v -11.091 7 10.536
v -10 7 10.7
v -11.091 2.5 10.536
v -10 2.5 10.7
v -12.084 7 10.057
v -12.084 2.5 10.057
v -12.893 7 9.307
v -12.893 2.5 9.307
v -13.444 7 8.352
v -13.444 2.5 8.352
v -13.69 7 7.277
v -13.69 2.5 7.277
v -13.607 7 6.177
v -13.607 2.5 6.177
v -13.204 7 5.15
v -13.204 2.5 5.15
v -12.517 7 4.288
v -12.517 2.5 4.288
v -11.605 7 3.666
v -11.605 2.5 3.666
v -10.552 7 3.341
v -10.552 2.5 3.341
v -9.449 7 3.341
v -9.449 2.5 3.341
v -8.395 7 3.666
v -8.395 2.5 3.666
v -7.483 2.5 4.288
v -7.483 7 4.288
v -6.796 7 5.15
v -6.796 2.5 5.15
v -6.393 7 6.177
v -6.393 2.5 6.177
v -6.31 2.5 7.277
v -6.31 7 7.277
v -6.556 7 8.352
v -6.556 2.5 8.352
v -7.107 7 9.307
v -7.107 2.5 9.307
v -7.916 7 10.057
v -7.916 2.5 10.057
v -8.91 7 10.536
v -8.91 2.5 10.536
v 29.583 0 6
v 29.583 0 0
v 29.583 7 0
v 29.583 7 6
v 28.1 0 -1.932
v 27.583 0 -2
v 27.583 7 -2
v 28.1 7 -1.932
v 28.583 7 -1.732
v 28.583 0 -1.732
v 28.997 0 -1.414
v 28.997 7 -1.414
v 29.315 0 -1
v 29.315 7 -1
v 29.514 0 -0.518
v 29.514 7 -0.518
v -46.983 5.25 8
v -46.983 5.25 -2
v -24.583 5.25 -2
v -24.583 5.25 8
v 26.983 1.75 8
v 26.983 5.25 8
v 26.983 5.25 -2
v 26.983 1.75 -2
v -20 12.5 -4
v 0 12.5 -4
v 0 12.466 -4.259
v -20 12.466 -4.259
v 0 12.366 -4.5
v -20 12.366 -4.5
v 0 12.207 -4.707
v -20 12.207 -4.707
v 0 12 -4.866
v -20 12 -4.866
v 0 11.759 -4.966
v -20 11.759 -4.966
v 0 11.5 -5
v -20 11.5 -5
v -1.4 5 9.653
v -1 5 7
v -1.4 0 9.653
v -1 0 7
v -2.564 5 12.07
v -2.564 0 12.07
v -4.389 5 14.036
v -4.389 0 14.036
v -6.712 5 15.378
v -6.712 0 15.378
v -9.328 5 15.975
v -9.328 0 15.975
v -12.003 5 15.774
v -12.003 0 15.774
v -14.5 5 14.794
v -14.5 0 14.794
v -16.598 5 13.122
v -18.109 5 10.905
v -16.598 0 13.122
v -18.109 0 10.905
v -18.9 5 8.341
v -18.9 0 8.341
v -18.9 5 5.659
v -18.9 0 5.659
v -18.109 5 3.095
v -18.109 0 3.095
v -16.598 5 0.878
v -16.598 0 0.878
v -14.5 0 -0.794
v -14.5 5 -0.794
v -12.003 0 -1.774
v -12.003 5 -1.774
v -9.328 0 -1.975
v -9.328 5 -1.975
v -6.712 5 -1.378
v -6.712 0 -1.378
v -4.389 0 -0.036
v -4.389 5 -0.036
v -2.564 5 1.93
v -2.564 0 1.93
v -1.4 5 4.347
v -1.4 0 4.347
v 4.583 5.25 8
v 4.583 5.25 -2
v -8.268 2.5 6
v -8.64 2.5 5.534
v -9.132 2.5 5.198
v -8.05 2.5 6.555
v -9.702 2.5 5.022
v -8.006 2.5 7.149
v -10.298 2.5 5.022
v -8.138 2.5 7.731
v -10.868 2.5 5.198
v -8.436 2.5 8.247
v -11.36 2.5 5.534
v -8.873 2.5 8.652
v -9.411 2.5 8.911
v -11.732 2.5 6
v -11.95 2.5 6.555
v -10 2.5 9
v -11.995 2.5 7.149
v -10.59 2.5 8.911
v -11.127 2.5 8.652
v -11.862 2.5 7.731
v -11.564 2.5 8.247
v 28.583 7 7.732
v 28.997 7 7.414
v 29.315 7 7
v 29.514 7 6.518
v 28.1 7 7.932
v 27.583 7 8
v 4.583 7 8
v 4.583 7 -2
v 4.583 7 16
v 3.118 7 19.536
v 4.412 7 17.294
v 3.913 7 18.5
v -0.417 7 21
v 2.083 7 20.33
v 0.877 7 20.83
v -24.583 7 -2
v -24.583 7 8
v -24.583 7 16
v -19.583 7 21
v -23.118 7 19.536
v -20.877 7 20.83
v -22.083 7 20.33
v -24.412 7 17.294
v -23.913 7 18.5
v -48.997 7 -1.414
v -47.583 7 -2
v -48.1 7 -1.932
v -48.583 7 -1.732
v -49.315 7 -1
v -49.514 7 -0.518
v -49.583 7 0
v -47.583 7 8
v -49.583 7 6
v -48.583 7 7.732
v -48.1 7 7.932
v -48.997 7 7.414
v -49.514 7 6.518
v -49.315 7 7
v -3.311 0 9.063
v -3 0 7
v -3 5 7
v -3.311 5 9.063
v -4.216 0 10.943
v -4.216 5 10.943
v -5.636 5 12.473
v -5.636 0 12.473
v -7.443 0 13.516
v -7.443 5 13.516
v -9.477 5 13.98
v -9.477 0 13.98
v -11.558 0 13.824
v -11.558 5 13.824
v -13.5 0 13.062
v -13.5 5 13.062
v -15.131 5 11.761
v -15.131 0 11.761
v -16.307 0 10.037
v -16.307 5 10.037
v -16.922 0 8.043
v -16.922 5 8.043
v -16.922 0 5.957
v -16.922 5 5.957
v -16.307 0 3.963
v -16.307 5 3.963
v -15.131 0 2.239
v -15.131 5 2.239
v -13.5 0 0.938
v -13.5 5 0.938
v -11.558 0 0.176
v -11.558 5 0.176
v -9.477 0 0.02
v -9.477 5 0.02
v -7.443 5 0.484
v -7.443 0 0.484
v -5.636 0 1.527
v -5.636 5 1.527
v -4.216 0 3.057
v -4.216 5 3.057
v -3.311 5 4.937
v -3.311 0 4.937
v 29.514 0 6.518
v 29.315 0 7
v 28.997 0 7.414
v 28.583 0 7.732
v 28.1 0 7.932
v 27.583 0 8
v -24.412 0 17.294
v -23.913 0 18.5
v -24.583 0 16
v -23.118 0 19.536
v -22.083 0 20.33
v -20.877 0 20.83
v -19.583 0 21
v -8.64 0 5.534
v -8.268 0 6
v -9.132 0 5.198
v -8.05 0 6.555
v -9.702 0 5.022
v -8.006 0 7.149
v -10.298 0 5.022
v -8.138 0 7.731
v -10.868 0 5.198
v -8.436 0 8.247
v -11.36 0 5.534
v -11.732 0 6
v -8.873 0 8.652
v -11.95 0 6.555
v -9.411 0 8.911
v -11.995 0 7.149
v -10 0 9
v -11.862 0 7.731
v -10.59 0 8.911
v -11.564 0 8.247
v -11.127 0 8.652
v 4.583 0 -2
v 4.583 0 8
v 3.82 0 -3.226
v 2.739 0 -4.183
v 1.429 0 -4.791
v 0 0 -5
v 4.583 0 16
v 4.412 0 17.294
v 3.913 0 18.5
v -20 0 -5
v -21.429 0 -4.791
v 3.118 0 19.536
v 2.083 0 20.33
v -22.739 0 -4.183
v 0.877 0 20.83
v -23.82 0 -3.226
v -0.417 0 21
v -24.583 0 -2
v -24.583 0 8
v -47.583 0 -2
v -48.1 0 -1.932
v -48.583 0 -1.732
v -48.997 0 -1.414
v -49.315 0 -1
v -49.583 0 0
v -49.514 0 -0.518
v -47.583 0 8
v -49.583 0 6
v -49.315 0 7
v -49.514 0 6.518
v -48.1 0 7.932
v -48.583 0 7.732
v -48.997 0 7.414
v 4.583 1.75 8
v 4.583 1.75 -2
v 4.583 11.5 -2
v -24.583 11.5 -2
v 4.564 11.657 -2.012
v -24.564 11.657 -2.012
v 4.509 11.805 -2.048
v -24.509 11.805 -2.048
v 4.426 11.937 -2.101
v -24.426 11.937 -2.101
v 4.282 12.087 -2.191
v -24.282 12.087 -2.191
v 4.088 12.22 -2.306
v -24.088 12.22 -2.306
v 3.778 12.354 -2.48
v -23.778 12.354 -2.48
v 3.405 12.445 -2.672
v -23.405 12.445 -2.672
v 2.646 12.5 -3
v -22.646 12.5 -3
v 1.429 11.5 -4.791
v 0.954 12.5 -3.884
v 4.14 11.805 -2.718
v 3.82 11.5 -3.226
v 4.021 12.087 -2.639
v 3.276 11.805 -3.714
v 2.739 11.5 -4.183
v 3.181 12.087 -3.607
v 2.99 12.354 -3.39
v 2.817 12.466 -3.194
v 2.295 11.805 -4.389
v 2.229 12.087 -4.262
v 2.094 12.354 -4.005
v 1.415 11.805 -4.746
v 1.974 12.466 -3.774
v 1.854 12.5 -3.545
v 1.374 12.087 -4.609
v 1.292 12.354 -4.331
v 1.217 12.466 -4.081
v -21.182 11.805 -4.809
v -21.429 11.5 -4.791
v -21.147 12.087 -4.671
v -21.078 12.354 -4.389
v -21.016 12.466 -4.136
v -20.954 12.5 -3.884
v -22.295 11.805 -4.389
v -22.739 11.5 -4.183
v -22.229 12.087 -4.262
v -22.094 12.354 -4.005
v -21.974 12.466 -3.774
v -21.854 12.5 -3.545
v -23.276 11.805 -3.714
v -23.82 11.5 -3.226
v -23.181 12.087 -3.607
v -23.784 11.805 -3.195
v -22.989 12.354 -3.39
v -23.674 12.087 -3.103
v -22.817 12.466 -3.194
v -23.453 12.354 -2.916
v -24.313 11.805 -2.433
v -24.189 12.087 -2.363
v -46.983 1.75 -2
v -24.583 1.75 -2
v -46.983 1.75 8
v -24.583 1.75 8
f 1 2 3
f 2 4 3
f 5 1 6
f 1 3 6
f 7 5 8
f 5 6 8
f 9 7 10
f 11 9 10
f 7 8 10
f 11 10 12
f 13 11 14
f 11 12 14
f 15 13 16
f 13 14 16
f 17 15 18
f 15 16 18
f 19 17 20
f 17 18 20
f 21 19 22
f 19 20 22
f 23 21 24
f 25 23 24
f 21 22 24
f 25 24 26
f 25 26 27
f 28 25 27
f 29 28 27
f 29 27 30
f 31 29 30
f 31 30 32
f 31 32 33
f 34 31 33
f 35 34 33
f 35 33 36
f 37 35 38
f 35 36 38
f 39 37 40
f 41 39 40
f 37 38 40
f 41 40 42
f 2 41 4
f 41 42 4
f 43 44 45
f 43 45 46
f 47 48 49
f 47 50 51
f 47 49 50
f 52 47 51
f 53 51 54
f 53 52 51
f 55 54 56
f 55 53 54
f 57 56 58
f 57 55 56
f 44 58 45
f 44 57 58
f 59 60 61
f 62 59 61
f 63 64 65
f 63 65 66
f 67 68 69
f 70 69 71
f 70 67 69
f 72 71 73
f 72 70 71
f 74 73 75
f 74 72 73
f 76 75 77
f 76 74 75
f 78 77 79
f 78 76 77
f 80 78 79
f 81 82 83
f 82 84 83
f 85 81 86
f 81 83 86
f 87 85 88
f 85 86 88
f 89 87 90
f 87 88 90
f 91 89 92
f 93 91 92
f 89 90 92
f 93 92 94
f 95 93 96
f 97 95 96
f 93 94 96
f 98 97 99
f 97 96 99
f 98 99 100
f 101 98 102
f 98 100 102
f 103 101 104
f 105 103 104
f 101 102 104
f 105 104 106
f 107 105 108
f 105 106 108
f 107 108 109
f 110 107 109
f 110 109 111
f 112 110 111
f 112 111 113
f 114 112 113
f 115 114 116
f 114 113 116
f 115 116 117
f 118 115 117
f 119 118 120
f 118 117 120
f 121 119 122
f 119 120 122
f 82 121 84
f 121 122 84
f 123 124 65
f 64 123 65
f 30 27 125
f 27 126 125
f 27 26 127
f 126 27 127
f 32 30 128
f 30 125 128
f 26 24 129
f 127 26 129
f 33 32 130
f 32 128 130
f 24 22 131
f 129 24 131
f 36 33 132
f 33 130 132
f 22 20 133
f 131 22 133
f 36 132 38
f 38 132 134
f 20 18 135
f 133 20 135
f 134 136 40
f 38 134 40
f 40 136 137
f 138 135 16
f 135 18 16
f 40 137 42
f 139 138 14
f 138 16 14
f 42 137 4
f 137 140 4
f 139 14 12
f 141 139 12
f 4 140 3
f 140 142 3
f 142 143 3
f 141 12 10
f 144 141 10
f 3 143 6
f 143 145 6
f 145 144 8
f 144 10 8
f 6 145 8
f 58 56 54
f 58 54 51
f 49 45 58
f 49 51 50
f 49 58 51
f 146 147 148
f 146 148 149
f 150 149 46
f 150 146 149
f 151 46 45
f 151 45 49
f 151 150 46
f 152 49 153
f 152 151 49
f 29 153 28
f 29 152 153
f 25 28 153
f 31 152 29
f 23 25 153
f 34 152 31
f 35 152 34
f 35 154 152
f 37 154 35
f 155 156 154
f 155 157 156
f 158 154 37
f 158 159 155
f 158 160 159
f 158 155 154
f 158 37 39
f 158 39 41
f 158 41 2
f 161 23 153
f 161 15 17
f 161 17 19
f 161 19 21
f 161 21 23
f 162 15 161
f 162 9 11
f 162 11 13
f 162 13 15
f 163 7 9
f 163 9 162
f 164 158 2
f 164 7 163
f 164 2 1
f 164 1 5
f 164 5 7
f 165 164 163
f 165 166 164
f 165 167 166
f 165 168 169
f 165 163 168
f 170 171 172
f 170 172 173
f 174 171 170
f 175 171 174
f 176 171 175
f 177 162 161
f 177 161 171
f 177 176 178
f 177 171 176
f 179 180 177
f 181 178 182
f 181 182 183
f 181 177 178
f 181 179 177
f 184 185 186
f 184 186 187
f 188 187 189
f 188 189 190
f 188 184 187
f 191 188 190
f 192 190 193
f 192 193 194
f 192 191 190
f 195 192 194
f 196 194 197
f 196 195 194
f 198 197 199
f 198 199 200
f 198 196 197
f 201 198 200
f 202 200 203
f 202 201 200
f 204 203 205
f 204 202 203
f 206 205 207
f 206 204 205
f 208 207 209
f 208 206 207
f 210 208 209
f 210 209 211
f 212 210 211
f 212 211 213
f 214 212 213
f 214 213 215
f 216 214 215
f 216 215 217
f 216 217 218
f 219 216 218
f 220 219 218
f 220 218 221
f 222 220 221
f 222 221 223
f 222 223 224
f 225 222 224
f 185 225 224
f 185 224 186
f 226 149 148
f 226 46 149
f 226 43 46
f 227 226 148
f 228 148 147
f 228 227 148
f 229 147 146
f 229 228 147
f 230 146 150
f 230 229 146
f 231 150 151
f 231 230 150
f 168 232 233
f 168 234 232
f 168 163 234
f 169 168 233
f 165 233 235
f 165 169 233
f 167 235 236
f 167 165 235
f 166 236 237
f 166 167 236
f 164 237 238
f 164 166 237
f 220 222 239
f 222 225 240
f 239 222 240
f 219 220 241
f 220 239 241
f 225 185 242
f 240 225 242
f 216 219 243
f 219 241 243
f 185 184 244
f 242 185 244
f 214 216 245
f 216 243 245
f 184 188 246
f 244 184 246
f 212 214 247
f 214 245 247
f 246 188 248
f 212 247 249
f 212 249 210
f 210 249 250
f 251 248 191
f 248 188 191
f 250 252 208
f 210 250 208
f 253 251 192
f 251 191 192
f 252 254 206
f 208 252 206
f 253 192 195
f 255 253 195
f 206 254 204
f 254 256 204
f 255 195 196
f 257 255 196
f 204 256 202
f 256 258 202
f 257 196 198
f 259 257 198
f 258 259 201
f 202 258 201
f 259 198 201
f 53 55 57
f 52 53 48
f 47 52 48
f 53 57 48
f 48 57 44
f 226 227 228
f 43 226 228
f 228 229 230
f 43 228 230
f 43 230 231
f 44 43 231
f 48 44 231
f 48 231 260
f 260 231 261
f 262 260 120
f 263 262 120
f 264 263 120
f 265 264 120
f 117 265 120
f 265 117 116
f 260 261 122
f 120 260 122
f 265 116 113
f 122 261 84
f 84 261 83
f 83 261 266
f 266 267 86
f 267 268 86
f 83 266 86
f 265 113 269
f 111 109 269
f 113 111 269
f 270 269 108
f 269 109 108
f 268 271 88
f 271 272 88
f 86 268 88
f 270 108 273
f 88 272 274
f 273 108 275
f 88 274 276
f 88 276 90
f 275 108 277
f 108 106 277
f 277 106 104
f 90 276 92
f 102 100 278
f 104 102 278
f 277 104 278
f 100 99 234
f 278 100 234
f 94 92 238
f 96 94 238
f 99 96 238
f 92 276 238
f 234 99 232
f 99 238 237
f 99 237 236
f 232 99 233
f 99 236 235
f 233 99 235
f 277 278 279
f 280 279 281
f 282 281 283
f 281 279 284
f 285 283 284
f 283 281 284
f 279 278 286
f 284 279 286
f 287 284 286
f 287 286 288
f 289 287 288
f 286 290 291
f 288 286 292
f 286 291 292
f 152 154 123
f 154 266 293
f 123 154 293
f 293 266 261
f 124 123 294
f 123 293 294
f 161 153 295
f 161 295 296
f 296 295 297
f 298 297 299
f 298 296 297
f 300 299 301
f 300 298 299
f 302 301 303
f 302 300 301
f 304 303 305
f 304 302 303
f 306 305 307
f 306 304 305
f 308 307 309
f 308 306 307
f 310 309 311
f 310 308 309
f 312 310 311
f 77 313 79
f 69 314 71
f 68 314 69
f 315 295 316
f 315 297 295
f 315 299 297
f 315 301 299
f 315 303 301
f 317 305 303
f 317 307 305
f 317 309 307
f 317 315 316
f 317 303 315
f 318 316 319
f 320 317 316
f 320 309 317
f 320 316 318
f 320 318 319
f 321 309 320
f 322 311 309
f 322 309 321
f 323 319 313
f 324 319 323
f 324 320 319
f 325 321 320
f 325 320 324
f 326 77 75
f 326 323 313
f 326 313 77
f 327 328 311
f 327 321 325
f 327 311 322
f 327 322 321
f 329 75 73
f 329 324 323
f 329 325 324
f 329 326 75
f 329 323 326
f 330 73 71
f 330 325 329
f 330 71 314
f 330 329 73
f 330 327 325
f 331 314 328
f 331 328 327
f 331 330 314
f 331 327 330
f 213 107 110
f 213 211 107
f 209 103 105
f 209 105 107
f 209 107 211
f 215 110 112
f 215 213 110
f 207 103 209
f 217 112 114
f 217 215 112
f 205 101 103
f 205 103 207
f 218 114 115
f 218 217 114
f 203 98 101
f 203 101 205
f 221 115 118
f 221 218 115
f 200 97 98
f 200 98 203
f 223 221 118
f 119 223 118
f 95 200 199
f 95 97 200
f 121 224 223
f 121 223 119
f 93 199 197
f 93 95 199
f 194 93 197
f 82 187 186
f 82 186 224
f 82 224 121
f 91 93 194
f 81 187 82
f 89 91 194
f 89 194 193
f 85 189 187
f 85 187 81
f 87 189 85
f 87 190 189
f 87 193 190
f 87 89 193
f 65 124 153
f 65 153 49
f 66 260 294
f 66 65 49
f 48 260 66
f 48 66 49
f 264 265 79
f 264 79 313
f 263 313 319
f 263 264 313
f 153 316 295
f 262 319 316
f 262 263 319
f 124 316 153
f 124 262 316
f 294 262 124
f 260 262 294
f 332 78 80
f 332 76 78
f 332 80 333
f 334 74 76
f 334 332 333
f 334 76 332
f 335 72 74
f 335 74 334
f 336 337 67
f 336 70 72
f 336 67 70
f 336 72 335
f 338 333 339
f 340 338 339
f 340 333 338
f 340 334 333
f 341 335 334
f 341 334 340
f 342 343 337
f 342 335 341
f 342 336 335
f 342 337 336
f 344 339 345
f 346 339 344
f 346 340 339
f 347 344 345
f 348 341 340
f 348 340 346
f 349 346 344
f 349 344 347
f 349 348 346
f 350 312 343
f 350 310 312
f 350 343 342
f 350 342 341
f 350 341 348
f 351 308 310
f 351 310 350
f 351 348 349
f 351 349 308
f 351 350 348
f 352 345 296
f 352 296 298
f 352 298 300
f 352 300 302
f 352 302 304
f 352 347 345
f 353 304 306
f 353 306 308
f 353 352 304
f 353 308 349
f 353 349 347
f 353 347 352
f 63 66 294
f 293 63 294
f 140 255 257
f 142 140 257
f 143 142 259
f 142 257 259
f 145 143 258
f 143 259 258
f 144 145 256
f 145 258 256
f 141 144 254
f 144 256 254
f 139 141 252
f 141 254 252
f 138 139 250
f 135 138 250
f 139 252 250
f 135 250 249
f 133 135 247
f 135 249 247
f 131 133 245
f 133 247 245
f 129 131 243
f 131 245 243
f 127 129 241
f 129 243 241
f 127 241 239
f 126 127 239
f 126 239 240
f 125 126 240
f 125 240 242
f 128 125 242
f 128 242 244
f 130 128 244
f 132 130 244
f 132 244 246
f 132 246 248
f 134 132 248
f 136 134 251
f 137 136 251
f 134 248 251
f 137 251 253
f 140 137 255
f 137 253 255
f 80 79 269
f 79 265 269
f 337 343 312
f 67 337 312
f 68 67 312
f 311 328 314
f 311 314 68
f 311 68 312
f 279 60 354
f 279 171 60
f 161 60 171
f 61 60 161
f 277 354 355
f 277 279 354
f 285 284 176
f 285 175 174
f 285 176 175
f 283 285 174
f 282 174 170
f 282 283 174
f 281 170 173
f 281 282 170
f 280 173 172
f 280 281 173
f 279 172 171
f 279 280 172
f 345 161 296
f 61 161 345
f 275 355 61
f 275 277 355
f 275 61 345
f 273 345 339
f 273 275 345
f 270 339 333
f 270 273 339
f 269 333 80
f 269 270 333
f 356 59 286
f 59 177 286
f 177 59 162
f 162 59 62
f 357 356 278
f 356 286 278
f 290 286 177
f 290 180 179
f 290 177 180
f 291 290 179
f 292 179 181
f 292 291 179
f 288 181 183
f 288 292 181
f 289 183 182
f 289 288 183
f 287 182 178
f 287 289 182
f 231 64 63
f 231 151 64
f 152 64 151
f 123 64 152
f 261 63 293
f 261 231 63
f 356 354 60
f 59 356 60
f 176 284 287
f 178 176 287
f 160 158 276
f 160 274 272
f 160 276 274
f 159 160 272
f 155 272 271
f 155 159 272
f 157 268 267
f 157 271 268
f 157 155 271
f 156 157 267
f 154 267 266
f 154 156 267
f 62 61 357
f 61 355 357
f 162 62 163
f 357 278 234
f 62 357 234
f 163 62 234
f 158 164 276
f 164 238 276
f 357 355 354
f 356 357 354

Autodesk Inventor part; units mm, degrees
ref_plane "YZ Plane" through (0, 0, 0) normal (1, 0, 0) x (0, 1, 0)
ref_plane "XZ Plane" through (0, 0, 0) normal (0, 1, 0) x (-1, 0, 0)
ref_plane "XY Plane" through (0, 0, 0) normal (0, 0, 1) x (1, 0, 0)
sketch "Sketch1" plane through (0, 0, 0) normal (0, 1, 0) x (-1, 0, 0)
  arc A0 (-4.5826, -2) -> (0, -5) centre (0, 0) ccw
  line L0 (47.5826, -2) -> (24.5826, -2)
  arc A1 (20, -5) -> (24.5826, -2) centre (20, 0) ccw
  line L1 (0, -5) -> (20, -5)
  line L2 (49.5826, 0) -> (49.5826, 6)
  line L3 (47.5826, 8) -> (24.5826, 8)
  arc A2 (49.5826, 6) -> (47.5826, 8) centre (47.5826, 6) ccw
  arc A3 (47.5826, -2) -> (49.5826, 0) centre (47.5826, 0) ccw
  line L4 (-4.5826, -2) -> (-27.5826, -2)
  line L5 (-29.5826, 0) -> (-29.5826, 6)
  line L6 (-27.5826, 8) -> (-4.5826, 8)
  line L7 (24.5826, 8) -> (24.5826, 21)
  line L8 (24.5826, 21) -> (-4.5826, 21)
  line L9 (-4.5826, 21) -> (-4.5826, 8)
  arc A4 (-29.5826, 0) -> (-27.5826, -2) centre (-27.5826, 0) ccw
  arc A5 (-27.5826, 8) -> (-29.5826, 6) centre (-27.5826, 6) ccw
  point P0 (49.5826, -2)
  point P1 (49.5826, 8)
  point P2 (-29.5826, -2)
  point P3 (-29.5826, 8)
  dimension "d0" = 5
  dimension "d8" = 5
  dimension "d9" = 20
  dimension "d12" = 3
  dimension "d14" = 10
  dimension "d15" = 2
  dimension "d49" = 25
  dimension "d50" = 25
  dimension "d51" = 10
  dimension "d52" = 26
  dimension "d53" = 2
extrude "Extrusion1" add sketch "Sketch1" along normal blind 7
fillet "Fillet2" radius 5 2 edges at (-24.5826, 3.5, 21) (4.5826, 3.5, 21)
sketch "Sketch7" plane through (-24.5826, 0, -2) normal (0, 0, -1) x (-1, 0, 0)
  line L0 (0, 7) -> (23, 7) projected
  line L1 (-52.1652, 0) -> (-29.1652, 0) projected
  line L2 (-29.1652, 0) -> (-29.1652, 7) projected
  line L3 (-52.1652, 7) -> (-29.1652, 7) projected
  line L4 (-52.1652, 0) -> (-52.1652, 7) projected
  line L5 (-51.5652, 1.75) -> (-29.1652, 1.75)
  line L6 (-29.1652, 1.75) -> (-29.1652, 5.25)
  line L7 (-29.1652, 5.25) -> (-51.5652, 5.25)
  line L8 (-51.5652, 5.25) -> (-51.5652, 1.75)
  line L9 (0, 1.75) -> (22.4, 1.75)
  line L10 (22.4, 1.75) -> (22.4, 5.25)
  line L11 (22.4, 5.25) -> (0, 5.25)
  line L12 (0, 5.25) -> (0, 1.75)
  line L13 (-54.1652, 0) -> (-54.1652, 7) projected
  line L14 (25, 0) -> (25, 7) projected
  point P0 (-24.5826, 0)
  dimension "d55" = 22.4
  dimension "d56" = 3.5
  dimension "d57" = 1.75
  dimension "d58" = 2.6
  dimension "d59" = 2.6
extrude "Extrusion7" cut sketch "Sketch7" against normal up to next contours L5 L8 L7 L2 | L12 L11 L10 L9
sketch "Sketch8" plane through (0, 0, 0) normal (0, -1, 0) x (1, 0, 0)
  line L0 (-24.5826, 8) -> (-24.5826, 16) projected
  line L1 (0, -5) -> (-20, -5) projected
  circle A0 centre (-10.0001, 7) radius 9
  circle A1 centre (-10.0001, 7) radius 7
  dimension "d62" = 18
  dimension "d63" = 12
  dimension "d64" = 14
  dimension "d65" = 14.5825
extrude "Extrusion8" cut sketch "Sketch8" against normal blind 5
sketch "Sketch11" plane through (0, 7, 0) normal (0, 1, 0) x (1, 0, 0)
  arc A0 (4.5826, 2) -> (0, 5) centre (0, 0) ccw projected
  line L0 (0, 5) -> (-20, 5) projected
  arc A1 (-20, 5) -> (-24.5826, 2) centre (-20, 0) ccw projected
  line L1 (-24.5826, 2) -> (-47.5826, 2) projected
  line L2 (4.5826, 2) -> (-24.5826, 2)
extrude "Extrusion11" add sketch "Sketch11" along normal blind 5.5
fillet "Fillet3" radius 1 4 edges at (-22.7386, 12.5, -4.1833) (2.7386, 12.5, -4.1833) (-10, 12.5, -5) (-10, 12.5, -2)
sketch "Sketch12" plane through (0, 7, 0) normal (0, 1, 0) x (1, 0, 0)
  circle A0 centre (-10.0001, -7) radius 7 projected
  point P0 (0, 0)
hole "Hole1" at (-10.0001, 7, 7) direction (0, -1, 0) diameter 4 end through all counterbore diameter 7.4 counterbore depth 4.5
properties part number "BedClipUltiBotsMiddle" material "ABS Plastic"
